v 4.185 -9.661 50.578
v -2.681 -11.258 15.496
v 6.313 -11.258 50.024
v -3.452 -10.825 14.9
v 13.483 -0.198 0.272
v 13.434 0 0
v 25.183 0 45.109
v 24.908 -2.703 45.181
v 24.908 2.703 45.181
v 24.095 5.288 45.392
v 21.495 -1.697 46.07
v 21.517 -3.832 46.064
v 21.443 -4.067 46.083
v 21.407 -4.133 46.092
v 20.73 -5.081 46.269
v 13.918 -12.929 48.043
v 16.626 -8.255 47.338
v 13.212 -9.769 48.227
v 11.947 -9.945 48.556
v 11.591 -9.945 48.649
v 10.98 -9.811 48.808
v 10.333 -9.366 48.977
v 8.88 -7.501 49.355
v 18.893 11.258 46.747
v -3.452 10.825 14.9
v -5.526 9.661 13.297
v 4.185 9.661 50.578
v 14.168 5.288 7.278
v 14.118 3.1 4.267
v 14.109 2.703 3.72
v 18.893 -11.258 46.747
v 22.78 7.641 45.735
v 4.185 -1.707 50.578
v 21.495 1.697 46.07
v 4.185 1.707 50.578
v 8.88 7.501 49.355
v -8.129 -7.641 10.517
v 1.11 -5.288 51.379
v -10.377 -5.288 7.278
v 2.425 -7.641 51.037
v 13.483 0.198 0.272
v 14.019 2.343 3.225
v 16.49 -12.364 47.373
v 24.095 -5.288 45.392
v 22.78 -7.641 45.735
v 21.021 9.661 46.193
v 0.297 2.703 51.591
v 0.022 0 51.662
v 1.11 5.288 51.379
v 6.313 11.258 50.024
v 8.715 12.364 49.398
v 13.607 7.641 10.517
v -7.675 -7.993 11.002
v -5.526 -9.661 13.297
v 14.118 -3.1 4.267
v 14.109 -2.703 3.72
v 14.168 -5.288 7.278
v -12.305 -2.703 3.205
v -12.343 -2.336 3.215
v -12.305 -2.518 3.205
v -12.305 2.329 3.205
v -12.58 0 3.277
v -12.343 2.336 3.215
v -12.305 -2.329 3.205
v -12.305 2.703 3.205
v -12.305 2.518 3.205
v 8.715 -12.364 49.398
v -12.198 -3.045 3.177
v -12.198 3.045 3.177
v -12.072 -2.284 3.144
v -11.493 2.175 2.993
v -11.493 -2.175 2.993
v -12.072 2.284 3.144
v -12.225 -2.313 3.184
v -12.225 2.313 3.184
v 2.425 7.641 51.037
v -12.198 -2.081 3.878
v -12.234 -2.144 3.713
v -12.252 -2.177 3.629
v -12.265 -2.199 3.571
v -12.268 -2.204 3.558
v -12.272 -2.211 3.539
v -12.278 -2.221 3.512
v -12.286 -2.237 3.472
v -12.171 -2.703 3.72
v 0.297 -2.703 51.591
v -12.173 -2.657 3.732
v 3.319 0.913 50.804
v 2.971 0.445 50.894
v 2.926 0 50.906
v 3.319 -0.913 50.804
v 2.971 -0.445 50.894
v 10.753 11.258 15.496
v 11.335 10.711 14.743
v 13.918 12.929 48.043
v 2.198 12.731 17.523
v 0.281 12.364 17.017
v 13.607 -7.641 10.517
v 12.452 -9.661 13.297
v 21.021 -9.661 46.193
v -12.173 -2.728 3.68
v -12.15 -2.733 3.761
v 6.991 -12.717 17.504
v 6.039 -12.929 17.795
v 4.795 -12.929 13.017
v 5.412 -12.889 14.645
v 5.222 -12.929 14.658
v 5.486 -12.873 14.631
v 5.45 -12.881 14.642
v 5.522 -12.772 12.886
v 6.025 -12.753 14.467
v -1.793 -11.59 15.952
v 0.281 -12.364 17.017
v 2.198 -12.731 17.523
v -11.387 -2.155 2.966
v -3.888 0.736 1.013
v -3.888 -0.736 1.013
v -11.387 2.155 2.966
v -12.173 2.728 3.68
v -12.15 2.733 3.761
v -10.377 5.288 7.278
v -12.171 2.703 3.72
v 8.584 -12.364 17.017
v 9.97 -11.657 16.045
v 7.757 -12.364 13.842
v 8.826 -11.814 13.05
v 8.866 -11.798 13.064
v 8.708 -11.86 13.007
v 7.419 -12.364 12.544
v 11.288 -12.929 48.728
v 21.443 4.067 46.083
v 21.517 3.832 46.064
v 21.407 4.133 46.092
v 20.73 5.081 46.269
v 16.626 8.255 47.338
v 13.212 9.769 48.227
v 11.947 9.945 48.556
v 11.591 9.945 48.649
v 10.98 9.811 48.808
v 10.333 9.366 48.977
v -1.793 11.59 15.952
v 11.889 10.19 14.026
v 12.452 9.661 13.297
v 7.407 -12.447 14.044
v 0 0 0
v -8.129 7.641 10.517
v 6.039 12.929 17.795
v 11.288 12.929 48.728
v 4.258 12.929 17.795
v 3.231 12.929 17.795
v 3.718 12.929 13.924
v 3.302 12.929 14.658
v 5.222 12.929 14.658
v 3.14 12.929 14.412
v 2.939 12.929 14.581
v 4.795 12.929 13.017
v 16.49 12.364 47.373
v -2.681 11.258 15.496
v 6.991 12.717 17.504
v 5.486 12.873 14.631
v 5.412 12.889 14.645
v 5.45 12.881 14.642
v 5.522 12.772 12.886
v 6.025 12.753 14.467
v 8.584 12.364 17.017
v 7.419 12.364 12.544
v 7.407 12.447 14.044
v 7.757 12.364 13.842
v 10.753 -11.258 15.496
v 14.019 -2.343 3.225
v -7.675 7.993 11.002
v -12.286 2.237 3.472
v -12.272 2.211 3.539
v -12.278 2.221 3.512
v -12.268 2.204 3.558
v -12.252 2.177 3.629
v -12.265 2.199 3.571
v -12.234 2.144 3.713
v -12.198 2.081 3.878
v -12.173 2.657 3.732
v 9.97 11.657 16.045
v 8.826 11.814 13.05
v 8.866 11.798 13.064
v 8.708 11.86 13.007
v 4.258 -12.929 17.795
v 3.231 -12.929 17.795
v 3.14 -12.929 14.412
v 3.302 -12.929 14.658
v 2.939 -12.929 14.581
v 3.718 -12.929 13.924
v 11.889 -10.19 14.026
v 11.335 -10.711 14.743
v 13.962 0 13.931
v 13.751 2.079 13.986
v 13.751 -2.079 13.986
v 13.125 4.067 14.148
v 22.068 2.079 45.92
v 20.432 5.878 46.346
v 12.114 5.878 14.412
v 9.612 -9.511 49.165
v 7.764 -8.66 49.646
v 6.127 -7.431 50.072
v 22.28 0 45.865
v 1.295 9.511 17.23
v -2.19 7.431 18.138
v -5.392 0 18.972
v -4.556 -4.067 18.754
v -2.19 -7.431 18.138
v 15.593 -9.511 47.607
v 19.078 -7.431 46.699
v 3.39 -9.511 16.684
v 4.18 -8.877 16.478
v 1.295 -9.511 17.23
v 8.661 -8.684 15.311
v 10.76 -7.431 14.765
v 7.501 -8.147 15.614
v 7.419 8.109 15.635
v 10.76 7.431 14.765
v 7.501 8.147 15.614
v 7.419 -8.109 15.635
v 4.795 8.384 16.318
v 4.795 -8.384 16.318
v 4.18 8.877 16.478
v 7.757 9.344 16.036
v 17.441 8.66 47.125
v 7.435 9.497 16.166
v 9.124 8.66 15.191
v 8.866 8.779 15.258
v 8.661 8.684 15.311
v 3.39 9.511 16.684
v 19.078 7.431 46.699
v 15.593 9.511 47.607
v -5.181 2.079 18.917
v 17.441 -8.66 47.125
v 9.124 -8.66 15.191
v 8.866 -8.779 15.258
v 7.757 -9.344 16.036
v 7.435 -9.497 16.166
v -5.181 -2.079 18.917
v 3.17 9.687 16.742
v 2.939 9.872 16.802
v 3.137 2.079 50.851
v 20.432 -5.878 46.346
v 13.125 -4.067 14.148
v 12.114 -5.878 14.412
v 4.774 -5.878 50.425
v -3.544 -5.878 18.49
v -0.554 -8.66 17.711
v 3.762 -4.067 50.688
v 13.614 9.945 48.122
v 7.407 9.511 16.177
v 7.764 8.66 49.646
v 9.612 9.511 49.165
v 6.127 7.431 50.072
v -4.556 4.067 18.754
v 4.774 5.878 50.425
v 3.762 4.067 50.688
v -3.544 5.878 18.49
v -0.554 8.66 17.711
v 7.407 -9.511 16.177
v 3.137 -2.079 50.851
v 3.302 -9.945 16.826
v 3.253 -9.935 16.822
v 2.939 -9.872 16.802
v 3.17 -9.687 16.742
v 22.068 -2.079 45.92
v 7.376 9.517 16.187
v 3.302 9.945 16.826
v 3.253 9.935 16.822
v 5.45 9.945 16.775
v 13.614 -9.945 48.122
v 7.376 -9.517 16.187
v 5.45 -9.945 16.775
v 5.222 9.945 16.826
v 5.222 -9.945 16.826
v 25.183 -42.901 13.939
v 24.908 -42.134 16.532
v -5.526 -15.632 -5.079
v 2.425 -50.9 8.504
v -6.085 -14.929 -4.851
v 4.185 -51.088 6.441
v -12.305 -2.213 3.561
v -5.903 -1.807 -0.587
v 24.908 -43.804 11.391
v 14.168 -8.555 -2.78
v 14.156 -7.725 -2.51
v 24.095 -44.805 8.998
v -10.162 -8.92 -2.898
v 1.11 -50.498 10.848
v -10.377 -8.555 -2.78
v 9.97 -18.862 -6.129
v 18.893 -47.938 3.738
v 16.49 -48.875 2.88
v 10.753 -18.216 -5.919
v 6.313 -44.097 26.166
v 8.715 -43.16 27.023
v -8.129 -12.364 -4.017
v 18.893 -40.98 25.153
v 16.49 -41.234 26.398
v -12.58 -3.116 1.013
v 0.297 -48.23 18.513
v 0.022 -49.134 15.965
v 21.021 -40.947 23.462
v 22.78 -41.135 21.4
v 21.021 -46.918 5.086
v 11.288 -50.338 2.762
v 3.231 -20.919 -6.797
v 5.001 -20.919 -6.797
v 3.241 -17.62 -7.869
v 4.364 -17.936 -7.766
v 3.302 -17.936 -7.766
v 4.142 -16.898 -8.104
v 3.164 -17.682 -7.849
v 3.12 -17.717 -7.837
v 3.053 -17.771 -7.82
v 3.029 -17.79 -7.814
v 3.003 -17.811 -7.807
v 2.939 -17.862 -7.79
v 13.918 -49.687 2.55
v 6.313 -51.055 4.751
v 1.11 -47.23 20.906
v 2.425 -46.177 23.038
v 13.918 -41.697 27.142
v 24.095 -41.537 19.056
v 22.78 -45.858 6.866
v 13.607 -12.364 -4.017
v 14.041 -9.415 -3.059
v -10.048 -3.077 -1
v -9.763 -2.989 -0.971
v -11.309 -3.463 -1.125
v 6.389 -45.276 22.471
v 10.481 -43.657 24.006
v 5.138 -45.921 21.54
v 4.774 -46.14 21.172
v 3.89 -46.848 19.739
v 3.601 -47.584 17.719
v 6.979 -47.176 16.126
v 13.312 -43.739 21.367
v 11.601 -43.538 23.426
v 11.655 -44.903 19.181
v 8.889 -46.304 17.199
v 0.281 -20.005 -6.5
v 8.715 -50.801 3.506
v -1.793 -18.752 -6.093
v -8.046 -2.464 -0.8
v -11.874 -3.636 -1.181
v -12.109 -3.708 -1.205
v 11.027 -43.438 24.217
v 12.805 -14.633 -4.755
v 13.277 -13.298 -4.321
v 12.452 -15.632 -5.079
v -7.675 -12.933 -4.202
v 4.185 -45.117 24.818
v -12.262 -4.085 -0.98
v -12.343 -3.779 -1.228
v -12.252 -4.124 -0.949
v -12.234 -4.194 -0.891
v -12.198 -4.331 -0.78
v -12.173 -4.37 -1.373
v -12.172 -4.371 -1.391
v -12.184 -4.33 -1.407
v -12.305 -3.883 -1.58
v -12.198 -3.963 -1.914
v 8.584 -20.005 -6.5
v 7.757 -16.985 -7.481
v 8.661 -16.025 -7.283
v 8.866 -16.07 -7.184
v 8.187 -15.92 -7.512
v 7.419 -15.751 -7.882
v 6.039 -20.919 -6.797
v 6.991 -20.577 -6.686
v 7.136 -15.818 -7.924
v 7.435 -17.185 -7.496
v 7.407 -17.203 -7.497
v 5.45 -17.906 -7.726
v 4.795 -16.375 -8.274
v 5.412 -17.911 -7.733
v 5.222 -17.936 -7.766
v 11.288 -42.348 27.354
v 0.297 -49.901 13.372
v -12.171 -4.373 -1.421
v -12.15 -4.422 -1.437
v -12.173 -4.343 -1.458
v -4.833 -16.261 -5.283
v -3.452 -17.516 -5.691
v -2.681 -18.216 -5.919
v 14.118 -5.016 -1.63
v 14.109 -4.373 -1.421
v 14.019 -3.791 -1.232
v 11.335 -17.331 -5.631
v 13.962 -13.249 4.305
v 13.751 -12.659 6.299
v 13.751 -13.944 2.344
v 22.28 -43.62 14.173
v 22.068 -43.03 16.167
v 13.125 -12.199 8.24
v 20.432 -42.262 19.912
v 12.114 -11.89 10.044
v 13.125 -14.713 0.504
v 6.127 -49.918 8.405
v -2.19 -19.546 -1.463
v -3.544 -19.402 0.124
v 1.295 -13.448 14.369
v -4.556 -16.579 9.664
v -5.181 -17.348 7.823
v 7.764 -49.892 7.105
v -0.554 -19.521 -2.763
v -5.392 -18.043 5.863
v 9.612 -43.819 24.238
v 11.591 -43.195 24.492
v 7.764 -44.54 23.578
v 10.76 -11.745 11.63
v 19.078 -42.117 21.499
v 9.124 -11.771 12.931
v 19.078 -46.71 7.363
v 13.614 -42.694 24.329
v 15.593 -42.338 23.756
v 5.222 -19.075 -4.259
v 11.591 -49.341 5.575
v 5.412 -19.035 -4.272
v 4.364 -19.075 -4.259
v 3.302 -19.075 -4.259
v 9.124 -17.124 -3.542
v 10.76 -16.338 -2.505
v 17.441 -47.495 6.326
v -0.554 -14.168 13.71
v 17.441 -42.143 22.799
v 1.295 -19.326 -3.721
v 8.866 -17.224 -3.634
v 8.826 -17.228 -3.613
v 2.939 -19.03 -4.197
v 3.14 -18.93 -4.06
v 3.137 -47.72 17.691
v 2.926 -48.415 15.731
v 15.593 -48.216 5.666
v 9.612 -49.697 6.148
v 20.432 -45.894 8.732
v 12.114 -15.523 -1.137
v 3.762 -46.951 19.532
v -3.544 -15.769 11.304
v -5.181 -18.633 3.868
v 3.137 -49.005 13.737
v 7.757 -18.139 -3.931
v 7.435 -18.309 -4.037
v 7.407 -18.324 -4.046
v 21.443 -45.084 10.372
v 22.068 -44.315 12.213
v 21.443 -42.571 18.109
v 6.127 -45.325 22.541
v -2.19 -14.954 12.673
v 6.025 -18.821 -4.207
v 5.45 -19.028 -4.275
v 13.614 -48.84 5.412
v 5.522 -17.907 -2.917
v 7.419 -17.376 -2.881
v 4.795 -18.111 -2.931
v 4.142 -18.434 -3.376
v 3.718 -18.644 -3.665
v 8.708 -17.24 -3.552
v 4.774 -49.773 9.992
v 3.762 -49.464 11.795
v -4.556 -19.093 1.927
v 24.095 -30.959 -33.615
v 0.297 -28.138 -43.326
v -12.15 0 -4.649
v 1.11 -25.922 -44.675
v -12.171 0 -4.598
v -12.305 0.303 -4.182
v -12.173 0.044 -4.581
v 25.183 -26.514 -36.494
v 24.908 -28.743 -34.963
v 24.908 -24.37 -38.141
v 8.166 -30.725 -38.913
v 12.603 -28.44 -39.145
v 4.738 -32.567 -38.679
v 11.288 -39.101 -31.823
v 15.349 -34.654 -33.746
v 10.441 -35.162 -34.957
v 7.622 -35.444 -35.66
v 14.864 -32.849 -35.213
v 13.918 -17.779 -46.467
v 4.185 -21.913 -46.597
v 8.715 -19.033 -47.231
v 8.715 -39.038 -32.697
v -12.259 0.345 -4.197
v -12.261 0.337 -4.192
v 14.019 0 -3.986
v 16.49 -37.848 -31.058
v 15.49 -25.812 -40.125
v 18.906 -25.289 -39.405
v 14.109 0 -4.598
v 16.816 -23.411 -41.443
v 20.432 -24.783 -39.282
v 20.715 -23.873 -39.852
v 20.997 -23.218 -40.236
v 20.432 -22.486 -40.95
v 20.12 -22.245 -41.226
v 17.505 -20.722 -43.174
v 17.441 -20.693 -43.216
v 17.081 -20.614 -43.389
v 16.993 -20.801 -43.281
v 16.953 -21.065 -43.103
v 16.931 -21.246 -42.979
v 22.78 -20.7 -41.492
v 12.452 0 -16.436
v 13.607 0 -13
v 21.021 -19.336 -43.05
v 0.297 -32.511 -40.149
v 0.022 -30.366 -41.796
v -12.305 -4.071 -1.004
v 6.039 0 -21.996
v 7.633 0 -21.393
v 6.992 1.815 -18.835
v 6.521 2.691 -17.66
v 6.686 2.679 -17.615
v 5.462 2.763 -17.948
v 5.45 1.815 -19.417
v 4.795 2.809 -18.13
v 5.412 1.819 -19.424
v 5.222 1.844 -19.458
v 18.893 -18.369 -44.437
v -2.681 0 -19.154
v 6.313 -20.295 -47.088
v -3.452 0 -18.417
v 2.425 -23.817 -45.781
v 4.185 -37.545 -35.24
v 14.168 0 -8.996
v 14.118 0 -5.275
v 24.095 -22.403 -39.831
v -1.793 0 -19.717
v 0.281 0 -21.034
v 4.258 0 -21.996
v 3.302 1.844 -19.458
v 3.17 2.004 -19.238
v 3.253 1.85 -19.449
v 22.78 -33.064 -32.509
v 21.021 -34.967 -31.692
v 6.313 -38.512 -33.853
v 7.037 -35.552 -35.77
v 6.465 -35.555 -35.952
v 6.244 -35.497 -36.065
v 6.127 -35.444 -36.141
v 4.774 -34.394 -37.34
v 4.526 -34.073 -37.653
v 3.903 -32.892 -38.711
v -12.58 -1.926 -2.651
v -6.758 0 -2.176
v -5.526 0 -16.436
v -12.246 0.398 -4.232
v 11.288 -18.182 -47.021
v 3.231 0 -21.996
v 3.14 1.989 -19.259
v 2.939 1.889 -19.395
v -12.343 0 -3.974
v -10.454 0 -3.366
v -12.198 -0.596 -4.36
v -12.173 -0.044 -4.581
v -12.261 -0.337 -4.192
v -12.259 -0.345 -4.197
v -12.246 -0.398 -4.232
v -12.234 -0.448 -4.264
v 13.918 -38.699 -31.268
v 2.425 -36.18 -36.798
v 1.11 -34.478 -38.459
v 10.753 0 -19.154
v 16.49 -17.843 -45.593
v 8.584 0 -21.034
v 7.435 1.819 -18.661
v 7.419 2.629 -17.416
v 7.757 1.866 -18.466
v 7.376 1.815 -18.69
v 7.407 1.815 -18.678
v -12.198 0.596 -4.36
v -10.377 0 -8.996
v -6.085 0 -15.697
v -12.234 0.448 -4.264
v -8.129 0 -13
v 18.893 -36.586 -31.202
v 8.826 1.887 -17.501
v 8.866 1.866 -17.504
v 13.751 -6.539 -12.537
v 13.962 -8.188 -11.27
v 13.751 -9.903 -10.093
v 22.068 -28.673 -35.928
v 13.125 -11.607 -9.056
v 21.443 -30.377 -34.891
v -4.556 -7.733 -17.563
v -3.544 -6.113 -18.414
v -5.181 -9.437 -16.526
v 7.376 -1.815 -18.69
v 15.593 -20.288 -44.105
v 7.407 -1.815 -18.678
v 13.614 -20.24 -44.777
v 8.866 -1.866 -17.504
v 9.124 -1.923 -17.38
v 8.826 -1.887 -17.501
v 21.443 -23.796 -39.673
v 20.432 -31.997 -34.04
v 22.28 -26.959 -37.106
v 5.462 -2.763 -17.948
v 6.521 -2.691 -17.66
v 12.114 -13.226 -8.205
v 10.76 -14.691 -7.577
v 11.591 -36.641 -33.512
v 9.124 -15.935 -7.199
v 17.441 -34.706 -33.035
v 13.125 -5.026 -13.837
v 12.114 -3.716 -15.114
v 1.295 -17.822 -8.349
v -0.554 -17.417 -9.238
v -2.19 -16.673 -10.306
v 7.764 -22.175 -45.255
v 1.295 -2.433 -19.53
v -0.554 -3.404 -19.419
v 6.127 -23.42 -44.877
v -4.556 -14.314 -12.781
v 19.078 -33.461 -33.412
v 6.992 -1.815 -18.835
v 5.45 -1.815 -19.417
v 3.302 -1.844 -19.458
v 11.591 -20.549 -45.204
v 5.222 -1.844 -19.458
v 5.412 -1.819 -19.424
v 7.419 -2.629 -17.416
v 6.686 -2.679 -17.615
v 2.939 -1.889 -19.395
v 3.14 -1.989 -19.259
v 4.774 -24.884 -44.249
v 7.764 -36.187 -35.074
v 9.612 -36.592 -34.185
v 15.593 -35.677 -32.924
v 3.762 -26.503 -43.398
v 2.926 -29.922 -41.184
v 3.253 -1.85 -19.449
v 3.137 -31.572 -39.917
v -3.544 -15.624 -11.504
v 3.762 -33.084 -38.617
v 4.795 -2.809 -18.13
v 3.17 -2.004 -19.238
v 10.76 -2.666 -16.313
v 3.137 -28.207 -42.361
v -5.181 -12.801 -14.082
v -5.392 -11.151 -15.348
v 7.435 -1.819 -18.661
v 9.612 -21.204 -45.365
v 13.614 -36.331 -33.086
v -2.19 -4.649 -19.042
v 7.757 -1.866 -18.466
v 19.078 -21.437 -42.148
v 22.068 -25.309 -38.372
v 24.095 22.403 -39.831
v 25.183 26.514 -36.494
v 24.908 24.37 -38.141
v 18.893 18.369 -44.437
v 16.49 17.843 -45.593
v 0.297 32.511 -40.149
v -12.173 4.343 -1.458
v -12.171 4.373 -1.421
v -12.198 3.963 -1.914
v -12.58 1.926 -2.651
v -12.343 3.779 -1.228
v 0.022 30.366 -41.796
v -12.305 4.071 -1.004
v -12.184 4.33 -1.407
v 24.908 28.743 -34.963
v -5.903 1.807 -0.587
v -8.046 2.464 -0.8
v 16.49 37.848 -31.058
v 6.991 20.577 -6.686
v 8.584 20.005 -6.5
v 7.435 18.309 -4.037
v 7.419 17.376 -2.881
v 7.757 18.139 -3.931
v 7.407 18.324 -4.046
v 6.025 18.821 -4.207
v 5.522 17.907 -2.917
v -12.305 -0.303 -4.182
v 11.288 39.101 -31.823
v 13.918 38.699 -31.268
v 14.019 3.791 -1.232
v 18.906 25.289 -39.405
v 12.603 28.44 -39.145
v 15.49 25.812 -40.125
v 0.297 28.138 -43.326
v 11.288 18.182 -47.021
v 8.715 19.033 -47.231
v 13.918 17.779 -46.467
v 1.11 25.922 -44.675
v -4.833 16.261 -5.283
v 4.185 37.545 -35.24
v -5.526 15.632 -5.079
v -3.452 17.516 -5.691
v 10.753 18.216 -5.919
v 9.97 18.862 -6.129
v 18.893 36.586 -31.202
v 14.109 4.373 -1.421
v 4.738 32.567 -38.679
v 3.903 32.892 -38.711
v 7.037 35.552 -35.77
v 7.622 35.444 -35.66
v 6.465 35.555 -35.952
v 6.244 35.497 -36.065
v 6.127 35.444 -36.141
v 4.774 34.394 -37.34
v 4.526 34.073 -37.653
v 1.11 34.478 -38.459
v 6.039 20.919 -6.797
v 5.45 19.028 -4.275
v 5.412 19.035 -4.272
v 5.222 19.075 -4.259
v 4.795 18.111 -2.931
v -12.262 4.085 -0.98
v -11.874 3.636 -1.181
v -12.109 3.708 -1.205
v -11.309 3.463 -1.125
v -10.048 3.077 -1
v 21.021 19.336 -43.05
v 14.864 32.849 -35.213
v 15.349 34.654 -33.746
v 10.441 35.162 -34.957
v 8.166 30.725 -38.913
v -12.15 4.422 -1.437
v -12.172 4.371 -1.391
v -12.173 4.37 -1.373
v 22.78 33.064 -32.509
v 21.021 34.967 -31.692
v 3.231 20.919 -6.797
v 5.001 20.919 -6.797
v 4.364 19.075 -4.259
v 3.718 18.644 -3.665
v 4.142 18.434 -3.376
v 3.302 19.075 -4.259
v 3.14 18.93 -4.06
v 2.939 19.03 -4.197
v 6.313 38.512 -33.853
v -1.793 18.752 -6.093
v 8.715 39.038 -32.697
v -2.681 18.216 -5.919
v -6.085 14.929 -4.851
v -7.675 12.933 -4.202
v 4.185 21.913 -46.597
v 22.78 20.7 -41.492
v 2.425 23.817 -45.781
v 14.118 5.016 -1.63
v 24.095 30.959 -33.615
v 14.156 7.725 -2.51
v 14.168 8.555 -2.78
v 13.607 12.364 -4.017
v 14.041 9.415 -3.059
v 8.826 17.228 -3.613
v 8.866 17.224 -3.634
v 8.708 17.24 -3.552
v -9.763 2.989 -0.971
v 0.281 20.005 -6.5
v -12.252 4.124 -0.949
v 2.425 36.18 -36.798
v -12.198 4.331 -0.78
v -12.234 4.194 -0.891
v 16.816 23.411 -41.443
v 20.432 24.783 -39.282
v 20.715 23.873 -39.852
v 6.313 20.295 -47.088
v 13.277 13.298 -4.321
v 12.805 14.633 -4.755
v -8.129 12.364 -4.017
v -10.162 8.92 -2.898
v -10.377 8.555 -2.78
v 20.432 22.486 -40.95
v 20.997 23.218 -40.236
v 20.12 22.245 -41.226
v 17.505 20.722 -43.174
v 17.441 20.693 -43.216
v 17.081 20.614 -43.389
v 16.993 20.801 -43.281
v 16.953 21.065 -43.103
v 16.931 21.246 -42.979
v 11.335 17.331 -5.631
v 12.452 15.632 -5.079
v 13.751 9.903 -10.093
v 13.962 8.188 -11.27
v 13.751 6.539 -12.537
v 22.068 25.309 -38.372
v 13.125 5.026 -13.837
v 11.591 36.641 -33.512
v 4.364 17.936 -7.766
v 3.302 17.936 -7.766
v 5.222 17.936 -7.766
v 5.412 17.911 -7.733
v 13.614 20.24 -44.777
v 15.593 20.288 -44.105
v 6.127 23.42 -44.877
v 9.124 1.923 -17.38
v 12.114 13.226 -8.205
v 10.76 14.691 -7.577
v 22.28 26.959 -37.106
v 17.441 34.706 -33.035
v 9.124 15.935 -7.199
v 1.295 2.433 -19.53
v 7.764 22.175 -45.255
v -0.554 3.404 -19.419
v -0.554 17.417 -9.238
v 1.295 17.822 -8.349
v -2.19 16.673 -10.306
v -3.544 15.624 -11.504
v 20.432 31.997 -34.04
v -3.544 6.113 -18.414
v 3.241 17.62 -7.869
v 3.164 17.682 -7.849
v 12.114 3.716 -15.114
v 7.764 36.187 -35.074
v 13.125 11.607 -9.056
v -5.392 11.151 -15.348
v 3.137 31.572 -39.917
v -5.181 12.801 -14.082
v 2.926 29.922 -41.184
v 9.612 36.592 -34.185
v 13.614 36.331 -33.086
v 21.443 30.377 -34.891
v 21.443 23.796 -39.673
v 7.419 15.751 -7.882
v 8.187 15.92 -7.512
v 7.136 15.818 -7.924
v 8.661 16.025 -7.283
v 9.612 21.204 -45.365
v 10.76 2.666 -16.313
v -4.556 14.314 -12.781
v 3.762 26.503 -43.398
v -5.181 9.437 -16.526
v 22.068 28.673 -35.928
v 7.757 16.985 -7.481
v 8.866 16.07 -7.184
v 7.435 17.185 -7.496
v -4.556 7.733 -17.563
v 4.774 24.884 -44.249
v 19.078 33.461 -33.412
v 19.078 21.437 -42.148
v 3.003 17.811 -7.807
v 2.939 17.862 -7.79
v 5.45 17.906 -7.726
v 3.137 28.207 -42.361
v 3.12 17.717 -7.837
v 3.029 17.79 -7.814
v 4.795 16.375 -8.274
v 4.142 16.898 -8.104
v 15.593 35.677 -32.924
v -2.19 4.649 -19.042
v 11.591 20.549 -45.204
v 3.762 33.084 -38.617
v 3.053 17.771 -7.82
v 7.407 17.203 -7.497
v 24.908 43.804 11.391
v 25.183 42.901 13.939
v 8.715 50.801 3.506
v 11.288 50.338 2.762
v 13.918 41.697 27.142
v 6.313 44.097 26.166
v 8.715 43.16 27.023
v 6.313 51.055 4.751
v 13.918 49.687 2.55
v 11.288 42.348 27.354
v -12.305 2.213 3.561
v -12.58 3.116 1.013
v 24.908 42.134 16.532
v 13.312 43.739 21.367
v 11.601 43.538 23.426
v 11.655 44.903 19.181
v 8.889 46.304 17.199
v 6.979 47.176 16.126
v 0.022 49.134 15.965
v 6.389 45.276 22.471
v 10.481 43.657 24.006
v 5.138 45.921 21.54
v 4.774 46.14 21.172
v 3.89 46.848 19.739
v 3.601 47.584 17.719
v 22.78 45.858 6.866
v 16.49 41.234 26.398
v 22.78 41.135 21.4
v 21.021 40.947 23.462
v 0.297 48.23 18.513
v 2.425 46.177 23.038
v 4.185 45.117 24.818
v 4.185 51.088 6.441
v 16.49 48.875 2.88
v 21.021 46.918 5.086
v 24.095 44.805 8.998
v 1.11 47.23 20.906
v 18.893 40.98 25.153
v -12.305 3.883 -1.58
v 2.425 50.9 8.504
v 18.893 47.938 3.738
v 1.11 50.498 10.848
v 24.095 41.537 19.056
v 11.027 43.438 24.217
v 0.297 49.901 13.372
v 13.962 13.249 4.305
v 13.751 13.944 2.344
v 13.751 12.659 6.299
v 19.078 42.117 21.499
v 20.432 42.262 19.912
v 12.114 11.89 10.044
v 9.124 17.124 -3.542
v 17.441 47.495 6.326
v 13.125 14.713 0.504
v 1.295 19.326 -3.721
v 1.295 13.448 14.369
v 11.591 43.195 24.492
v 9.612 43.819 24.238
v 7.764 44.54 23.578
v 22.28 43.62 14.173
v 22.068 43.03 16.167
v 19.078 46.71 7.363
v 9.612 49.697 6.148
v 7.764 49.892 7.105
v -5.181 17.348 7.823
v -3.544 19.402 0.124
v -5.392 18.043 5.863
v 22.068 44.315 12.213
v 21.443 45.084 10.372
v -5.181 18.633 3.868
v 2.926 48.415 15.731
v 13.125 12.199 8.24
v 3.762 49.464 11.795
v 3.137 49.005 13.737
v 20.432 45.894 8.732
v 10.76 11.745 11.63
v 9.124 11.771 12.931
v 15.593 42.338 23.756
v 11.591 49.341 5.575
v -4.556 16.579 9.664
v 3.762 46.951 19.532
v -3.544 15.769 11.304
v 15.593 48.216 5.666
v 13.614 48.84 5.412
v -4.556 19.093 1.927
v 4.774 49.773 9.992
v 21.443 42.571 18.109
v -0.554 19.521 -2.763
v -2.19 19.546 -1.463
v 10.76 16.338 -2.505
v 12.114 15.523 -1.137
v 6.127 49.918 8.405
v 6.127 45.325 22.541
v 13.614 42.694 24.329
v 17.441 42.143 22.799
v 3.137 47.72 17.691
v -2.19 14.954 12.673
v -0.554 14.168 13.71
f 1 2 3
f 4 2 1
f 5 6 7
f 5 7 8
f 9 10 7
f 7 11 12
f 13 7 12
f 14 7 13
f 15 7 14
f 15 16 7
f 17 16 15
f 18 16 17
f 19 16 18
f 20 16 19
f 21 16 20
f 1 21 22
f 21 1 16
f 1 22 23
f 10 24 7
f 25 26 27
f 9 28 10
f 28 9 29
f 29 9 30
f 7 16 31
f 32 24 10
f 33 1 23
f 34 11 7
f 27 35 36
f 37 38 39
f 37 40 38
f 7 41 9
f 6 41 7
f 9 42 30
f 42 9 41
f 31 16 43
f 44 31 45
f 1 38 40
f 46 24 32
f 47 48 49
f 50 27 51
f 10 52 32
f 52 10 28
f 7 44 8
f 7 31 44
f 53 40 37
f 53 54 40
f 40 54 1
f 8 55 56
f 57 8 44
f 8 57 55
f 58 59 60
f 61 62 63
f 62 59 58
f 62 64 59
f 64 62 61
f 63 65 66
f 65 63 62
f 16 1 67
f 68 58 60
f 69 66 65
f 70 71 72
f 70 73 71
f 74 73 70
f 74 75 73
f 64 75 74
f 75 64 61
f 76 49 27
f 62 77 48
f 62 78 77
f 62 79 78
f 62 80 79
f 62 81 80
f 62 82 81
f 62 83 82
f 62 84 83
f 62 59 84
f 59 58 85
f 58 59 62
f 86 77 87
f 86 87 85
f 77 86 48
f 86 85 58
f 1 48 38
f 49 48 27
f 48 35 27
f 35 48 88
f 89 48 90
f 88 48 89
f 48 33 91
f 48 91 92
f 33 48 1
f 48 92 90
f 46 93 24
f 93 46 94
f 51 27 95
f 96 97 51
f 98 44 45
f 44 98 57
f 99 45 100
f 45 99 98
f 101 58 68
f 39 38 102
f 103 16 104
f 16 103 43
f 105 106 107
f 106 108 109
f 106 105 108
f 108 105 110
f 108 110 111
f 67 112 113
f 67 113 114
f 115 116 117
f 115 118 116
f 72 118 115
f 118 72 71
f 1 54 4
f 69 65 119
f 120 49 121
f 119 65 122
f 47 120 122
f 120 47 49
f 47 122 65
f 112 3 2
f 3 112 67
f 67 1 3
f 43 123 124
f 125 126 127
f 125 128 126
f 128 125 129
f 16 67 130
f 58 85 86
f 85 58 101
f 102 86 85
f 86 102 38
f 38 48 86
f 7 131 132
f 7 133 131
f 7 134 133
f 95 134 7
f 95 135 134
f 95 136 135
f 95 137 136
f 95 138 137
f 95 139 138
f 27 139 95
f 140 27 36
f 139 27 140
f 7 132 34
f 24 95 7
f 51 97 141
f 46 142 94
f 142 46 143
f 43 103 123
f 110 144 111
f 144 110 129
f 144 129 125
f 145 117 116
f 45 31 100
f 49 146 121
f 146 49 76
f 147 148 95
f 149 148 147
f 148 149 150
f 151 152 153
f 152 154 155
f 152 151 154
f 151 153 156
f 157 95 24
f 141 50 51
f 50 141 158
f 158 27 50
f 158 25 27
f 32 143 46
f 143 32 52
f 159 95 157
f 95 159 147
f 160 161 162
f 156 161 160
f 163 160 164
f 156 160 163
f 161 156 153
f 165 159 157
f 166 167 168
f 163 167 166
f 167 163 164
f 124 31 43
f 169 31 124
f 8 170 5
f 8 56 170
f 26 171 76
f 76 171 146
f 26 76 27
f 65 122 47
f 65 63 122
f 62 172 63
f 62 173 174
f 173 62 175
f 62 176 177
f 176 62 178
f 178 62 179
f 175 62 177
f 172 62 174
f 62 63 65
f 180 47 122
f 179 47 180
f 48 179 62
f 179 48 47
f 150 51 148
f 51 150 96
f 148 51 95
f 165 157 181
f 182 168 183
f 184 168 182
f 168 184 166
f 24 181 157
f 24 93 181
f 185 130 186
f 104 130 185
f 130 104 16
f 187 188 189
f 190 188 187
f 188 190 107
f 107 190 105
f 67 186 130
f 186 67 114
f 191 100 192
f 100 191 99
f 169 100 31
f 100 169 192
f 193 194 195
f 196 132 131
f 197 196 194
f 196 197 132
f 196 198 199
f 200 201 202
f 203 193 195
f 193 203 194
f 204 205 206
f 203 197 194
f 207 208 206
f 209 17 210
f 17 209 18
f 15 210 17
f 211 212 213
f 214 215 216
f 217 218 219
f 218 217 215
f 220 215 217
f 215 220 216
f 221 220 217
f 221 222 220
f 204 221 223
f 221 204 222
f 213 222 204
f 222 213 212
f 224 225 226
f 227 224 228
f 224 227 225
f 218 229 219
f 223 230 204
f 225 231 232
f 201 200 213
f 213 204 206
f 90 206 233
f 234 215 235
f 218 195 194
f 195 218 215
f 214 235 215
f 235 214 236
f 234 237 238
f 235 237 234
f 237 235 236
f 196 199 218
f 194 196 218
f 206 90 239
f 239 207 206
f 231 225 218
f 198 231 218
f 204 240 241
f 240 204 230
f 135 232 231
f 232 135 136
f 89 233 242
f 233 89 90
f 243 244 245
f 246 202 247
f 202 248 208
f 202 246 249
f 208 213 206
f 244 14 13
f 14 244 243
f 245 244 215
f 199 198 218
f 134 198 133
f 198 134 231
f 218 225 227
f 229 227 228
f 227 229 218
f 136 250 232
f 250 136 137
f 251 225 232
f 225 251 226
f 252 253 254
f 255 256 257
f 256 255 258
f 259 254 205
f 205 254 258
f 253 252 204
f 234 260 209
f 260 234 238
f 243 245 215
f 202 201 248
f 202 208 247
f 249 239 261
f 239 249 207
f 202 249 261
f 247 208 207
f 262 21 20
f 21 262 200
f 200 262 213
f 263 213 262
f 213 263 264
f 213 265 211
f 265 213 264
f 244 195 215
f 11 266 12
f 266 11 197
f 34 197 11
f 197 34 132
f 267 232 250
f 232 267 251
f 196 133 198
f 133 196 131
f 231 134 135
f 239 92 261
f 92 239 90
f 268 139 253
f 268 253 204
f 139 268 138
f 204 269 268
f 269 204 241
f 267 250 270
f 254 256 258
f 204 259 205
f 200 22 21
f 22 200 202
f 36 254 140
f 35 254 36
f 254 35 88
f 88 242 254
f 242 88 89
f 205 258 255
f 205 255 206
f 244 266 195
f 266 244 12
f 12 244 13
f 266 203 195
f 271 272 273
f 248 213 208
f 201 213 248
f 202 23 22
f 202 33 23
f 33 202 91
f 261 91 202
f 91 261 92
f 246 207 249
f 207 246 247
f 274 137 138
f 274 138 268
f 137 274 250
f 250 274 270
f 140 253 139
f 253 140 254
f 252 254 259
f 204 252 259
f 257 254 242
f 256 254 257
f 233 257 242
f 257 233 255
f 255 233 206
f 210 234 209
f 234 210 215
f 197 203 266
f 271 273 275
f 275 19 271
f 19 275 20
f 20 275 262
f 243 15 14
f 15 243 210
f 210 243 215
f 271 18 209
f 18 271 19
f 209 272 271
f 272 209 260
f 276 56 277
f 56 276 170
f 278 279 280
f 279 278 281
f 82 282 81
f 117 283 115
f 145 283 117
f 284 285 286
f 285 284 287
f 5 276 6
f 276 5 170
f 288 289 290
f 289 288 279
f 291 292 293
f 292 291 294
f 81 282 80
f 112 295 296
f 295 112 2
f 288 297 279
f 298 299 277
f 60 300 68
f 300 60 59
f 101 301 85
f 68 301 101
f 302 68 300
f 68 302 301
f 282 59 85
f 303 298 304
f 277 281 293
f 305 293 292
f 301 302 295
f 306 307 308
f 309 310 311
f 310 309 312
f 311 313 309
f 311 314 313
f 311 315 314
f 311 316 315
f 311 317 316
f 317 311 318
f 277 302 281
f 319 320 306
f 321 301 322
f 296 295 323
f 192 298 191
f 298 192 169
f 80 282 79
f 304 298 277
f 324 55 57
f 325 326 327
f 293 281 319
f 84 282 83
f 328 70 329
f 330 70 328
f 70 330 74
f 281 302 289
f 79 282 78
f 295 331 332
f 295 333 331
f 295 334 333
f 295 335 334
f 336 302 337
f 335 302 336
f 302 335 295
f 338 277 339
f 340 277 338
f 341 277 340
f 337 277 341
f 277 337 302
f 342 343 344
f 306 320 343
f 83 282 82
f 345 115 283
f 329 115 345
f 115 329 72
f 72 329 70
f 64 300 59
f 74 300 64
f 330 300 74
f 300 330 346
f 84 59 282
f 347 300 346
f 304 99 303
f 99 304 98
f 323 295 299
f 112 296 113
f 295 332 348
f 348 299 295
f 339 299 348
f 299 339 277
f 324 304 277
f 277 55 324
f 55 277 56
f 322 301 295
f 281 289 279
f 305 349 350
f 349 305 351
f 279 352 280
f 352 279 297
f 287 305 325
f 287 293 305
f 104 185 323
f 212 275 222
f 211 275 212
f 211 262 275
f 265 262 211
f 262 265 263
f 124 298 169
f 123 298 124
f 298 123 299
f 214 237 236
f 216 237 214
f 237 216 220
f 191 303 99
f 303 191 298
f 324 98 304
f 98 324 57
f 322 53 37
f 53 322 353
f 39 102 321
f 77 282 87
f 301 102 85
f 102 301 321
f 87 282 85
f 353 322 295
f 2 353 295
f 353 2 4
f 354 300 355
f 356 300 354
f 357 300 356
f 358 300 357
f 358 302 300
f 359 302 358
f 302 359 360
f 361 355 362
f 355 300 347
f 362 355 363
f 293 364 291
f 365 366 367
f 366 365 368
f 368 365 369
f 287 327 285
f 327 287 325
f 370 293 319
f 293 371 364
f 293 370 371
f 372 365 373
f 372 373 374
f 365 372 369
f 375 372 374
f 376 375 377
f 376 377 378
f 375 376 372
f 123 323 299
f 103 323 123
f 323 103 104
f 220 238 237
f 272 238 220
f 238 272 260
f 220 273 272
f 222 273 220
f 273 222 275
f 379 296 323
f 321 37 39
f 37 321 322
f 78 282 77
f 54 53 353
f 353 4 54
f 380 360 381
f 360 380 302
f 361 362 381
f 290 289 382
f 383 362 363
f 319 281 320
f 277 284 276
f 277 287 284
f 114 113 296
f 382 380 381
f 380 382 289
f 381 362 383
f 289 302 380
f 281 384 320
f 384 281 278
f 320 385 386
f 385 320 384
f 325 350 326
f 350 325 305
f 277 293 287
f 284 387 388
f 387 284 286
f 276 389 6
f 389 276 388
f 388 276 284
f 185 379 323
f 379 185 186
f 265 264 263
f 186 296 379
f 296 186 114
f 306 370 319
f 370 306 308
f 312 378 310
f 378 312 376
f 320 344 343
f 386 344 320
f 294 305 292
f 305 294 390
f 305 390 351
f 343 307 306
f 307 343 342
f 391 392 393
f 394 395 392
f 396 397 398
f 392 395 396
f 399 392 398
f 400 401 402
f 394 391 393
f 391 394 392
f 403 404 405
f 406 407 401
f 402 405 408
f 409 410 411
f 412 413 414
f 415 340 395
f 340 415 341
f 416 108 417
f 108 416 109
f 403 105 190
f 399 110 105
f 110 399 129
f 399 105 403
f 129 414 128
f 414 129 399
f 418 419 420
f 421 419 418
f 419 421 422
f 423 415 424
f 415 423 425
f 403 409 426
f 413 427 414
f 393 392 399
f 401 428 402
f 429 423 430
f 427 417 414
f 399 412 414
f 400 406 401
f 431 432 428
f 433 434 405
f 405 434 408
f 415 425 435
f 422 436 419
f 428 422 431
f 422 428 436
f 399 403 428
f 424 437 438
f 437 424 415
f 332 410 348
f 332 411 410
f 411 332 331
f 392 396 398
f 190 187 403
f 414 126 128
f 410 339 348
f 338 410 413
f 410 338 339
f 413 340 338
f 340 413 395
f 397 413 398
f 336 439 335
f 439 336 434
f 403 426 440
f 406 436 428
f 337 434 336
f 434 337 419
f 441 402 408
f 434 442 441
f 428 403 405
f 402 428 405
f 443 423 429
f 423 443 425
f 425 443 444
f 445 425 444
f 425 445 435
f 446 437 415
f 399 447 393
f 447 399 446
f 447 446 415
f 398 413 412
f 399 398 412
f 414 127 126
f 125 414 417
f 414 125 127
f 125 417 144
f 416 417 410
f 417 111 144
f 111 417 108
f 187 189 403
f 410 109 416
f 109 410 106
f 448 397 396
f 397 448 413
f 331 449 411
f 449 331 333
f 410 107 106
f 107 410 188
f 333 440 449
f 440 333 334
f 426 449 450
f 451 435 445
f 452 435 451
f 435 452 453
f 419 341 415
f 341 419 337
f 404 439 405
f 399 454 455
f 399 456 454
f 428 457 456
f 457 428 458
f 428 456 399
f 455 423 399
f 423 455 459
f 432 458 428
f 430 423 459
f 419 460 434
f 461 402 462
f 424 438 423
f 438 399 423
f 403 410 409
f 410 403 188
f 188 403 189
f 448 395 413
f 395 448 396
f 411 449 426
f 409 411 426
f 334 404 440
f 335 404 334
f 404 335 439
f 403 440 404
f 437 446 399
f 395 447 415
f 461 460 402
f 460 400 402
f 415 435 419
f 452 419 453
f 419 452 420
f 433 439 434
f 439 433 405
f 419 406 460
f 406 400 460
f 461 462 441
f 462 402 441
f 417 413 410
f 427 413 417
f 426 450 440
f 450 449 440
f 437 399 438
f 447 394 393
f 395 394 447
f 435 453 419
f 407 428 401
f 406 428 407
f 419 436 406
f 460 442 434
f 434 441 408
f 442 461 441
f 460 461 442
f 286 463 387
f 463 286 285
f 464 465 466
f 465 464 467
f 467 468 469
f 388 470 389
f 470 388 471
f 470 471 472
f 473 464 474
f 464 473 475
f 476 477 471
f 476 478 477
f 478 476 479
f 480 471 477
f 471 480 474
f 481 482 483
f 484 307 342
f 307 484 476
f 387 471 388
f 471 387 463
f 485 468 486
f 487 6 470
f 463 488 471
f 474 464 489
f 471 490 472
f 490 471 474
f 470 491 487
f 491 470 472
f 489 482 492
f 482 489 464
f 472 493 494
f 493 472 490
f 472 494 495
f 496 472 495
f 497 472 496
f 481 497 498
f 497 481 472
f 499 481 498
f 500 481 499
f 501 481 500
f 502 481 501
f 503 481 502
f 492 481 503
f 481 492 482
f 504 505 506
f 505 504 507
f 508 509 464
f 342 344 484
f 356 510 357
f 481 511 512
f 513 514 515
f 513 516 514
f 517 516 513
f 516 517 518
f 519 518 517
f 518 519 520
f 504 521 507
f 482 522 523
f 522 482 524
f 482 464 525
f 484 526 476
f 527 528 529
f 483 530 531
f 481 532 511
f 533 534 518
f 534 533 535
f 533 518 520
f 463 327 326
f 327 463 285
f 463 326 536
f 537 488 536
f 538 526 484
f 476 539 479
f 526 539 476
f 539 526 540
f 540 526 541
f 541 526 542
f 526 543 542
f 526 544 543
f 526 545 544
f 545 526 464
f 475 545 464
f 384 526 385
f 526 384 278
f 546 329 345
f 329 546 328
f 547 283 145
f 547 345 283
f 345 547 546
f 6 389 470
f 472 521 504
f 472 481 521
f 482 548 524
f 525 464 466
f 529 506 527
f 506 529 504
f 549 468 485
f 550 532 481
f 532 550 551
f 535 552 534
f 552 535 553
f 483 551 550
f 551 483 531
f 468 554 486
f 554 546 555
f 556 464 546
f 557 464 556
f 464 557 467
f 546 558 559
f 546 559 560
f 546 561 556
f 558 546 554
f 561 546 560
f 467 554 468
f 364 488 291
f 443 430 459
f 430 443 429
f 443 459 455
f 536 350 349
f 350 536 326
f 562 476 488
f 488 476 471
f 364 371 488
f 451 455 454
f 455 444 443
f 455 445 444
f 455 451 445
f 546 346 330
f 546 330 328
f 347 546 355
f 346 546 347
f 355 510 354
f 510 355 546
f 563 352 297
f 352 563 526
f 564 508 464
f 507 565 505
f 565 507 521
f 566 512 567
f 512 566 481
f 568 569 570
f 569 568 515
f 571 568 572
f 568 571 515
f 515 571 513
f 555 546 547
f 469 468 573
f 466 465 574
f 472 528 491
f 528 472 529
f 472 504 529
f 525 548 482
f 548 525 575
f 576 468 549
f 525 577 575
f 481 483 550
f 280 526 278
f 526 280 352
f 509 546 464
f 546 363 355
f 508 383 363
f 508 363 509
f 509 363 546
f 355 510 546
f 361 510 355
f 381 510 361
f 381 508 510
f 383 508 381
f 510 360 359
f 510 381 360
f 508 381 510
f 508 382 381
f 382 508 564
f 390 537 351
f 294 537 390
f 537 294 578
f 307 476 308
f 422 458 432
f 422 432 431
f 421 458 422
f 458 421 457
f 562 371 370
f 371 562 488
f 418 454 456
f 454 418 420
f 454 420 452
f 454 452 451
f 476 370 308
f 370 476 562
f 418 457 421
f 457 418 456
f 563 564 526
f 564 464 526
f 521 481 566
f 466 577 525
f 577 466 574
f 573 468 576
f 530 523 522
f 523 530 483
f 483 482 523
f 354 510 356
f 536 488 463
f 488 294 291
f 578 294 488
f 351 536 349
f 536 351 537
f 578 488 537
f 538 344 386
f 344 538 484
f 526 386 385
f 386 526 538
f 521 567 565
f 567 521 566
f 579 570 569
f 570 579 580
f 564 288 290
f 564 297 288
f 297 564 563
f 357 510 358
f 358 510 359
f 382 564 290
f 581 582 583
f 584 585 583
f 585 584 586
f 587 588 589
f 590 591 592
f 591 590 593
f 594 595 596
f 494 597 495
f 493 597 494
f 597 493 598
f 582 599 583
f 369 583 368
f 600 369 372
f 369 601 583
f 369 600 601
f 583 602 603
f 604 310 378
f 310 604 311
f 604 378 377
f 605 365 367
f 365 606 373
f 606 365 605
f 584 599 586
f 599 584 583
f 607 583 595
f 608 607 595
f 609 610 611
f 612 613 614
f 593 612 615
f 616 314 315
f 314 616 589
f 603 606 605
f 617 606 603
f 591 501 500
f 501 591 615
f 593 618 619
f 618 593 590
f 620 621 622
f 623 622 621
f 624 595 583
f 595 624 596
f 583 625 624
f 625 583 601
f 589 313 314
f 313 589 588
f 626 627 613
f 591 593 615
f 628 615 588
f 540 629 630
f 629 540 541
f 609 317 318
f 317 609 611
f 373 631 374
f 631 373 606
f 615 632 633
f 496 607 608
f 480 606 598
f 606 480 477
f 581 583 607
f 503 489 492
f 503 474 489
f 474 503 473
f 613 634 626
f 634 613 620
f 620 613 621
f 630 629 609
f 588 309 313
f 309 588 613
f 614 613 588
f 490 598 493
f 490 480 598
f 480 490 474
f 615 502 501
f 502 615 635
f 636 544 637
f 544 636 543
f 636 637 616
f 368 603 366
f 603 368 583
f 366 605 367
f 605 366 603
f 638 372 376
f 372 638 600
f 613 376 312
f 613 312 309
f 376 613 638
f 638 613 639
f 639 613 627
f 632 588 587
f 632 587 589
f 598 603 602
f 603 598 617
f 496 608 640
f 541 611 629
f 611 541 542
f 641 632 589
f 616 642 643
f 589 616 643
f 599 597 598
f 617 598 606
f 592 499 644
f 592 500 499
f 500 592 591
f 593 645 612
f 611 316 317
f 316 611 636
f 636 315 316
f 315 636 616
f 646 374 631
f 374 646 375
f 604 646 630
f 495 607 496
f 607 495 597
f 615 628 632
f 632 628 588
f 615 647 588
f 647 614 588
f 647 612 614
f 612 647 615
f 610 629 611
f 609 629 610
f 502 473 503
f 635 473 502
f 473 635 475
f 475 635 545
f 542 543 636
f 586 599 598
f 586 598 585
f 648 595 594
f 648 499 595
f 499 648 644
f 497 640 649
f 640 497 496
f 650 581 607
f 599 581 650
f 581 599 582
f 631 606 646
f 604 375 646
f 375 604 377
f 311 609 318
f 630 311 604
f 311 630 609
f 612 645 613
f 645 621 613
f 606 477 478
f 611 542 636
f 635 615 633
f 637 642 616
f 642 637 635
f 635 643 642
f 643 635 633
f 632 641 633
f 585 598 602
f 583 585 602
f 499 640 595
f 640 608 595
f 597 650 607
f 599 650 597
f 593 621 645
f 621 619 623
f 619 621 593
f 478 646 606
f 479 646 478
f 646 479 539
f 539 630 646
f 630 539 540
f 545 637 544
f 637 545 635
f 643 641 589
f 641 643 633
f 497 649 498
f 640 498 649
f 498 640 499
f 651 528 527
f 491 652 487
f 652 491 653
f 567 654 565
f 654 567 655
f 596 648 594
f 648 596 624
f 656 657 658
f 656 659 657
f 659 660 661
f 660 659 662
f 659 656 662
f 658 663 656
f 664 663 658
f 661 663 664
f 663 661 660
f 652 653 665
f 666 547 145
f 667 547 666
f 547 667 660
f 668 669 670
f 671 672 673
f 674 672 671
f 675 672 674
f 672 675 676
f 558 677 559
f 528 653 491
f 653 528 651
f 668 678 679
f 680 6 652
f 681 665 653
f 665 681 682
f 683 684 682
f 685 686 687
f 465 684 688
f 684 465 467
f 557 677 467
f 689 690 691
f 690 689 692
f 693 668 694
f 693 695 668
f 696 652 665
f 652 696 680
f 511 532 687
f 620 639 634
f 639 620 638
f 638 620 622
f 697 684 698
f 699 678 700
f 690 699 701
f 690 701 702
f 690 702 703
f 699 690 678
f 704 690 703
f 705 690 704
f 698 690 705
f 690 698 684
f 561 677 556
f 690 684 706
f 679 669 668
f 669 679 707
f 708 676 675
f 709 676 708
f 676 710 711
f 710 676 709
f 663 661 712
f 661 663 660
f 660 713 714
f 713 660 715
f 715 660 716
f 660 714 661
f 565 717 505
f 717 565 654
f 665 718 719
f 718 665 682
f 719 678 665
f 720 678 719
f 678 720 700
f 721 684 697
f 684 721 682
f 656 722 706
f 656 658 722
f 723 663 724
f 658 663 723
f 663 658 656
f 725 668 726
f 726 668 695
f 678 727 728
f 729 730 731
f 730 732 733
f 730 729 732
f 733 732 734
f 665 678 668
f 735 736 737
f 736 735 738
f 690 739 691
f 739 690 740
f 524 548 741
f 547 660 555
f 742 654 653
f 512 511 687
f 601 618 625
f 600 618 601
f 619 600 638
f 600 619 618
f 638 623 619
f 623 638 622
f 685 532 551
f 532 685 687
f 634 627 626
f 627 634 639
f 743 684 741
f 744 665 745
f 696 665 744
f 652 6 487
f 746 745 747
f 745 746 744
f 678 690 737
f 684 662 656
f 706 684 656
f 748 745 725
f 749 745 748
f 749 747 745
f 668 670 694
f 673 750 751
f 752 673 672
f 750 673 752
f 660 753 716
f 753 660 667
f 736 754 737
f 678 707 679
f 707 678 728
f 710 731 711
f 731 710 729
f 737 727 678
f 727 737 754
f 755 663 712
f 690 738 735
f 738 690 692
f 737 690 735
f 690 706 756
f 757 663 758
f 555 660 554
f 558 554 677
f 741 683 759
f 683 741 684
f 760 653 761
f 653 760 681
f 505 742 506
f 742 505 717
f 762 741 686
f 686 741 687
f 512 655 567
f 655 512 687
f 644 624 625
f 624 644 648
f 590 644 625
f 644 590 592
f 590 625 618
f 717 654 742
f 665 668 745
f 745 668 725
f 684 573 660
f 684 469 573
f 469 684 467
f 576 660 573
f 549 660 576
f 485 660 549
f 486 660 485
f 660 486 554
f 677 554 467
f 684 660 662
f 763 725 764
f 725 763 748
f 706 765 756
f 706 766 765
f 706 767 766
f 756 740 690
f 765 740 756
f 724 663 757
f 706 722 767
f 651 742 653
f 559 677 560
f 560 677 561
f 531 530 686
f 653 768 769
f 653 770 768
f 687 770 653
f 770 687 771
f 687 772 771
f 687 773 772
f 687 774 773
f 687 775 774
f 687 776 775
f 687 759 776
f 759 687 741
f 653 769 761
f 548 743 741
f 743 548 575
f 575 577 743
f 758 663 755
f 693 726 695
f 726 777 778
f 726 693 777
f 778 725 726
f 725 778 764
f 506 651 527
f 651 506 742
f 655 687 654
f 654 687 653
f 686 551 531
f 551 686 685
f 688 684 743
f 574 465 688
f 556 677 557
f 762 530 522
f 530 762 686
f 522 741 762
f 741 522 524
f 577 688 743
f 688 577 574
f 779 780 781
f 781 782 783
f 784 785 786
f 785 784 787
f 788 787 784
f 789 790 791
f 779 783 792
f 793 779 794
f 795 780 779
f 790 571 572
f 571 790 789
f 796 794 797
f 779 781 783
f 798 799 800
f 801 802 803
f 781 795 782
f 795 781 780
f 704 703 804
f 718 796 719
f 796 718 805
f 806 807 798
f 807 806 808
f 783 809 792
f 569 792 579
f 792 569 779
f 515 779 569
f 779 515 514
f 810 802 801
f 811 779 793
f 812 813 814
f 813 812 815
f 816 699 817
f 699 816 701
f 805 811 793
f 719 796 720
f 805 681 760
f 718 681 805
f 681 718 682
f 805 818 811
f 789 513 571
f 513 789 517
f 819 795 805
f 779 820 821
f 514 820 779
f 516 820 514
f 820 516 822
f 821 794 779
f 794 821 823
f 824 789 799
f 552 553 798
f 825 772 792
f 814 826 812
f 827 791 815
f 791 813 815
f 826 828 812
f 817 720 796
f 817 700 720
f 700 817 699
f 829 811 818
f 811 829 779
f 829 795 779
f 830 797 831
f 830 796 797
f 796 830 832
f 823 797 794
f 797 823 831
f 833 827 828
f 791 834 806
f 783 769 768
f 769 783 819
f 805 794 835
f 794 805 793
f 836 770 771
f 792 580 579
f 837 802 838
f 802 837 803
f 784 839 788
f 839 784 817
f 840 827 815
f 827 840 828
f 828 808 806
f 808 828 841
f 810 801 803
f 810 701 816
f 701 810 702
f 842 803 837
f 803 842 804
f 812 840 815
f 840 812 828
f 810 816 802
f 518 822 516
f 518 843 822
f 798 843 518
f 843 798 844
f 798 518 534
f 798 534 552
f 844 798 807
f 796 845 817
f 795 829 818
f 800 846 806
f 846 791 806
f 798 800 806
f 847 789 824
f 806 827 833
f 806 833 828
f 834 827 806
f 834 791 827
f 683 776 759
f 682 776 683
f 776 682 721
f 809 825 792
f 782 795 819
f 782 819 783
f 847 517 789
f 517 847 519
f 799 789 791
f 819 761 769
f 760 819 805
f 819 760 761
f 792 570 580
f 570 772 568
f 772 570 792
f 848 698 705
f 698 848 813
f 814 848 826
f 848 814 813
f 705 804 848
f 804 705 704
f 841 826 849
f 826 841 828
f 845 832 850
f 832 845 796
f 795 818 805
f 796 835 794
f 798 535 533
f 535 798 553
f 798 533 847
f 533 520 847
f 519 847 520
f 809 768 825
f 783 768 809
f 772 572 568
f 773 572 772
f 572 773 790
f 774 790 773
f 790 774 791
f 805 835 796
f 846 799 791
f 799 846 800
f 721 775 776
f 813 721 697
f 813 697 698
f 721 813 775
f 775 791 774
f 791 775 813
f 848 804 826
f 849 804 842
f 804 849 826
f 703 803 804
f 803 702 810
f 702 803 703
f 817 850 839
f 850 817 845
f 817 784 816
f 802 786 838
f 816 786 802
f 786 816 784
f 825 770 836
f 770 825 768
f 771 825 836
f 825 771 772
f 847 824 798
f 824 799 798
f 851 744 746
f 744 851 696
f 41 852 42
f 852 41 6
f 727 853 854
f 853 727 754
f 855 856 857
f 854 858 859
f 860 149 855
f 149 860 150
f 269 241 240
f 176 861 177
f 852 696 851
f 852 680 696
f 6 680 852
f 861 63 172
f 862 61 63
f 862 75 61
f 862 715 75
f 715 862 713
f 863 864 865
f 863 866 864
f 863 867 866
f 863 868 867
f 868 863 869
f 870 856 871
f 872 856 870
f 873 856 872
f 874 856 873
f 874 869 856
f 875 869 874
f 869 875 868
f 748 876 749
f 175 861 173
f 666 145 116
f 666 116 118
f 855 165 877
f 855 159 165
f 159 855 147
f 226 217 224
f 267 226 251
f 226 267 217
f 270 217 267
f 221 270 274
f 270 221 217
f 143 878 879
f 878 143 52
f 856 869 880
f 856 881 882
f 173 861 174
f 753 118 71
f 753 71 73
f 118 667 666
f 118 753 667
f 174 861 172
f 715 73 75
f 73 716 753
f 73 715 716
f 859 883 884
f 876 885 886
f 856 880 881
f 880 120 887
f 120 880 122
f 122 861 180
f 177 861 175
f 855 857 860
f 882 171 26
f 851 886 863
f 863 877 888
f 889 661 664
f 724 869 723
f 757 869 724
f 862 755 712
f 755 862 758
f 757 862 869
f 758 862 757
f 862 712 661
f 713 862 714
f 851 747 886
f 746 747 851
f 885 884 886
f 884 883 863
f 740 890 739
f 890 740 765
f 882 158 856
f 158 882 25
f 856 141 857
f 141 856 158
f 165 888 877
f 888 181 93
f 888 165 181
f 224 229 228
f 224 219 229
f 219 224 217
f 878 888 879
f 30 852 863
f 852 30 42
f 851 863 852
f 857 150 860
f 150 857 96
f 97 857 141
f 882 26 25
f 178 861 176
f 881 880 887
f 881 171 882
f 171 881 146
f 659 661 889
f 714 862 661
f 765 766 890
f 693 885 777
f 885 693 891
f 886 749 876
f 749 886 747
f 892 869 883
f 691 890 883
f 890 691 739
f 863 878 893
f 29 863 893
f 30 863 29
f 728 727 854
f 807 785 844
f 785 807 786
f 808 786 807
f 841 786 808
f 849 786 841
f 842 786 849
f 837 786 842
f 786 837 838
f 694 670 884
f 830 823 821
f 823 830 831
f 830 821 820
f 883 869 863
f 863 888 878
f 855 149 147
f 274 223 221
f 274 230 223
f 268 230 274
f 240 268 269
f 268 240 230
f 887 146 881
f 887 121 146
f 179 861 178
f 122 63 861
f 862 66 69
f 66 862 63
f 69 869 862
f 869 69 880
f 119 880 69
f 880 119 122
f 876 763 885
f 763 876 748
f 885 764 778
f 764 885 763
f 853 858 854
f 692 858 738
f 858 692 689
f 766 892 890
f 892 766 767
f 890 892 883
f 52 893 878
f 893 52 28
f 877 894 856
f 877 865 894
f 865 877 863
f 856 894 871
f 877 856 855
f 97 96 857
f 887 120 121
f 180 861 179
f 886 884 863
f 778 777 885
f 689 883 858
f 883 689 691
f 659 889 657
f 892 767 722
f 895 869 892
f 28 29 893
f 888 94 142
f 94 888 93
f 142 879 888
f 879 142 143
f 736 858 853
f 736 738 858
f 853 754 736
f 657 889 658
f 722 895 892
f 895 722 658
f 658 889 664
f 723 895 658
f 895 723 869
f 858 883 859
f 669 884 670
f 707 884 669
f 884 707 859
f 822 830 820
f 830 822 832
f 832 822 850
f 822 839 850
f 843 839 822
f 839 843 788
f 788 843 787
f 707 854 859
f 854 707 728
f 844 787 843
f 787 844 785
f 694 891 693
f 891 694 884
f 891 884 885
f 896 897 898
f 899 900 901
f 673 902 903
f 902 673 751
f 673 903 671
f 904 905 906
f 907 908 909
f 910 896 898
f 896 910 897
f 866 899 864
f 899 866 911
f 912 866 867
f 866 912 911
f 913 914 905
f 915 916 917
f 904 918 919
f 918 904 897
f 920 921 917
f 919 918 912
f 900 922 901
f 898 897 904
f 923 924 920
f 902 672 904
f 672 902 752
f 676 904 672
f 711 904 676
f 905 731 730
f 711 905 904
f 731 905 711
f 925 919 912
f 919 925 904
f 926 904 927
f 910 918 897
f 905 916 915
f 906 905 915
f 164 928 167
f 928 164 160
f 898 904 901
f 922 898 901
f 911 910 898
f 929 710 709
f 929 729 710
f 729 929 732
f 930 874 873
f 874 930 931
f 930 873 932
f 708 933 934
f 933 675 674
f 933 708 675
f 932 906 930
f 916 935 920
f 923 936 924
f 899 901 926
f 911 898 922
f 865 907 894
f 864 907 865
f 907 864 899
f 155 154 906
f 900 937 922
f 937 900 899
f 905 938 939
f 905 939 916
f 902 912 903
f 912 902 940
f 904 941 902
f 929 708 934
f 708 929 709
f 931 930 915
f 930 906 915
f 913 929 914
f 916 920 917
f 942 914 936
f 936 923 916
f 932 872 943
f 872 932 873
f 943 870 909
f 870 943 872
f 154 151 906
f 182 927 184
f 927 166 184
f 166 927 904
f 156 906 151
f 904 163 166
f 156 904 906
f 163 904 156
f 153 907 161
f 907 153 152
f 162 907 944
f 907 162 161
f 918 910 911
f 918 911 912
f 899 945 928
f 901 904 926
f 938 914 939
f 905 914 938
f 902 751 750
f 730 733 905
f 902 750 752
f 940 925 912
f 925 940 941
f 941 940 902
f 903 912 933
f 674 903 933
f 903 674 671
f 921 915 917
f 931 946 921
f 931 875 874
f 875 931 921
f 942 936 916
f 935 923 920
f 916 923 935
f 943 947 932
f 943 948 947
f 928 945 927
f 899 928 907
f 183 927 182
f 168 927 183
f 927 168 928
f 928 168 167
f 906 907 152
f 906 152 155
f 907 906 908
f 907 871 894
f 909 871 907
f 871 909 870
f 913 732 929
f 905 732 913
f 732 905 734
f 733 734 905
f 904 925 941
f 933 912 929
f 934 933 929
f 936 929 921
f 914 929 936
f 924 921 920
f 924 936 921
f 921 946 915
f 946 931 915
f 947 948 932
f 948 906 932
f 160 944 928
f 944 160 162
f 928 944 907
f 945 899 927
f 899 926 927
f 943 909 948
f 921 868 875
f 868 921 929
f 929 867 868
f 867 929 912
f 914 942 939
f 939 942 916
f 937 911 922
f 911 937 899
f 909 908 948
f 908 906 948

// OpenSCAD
$length_a = 1.09*10;
$length_b = 1.24*10;


$five_point_angle = acos(($length_b/(2*cos(54)))/$length_a);

echo($five_point_angle);

$tube_outer = 10;
$pipe_thickness = 3;
$pipe_endcap = 17;
$pipe_length = 50;


for(a= [0:4]) {
	difference() {
		rotate([a*(360/5), 0, 0])
		rotate([0, $five_point_angle, 0])
		linear_extrude(height=$pipe_length)
			circle($tube_outer+$pipe_thickness);
		rotate([a*(360/5), 0, 0])
		rotate([0, $five_point_angle, 0])
		translate([0, 0, $pipe_endcap])
		linear_extrude(height=$pipe_length - $pipe_endcap)
			circle($tube_outer);
	}
}
